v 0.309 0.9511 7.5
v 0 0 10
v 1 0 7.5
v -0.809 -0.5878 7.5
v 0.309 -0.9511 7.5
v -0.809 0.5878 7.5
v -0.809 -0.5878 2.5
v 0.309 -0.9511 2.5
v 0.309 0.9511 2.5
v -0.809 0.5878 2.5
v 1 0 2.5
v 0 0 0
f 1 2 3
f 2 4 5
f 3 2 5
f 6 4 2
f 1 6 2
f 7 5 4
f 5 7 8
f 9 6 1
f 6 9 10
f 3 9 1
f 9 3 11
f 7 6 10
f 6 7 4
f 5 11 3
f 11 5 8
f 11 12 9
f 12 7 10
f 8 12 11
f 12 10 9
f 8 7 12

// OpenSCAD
bearing_race_spline();

module bearing_race_spline(
    h = 10, 
    r = 1,
    taper = 2.5)
{
    cylinder_height = h - (taper * 2);
    
    translate([0,0,taper + cylinder_height])
    cylinder(h = taper, r1 = r, r2 = 0);
    
    translate([0,0,taper])
    cylinder(h = cylinder_height, r = r);
    
    cylinder(h = taper, r1 = 0, r2 = r);
}
